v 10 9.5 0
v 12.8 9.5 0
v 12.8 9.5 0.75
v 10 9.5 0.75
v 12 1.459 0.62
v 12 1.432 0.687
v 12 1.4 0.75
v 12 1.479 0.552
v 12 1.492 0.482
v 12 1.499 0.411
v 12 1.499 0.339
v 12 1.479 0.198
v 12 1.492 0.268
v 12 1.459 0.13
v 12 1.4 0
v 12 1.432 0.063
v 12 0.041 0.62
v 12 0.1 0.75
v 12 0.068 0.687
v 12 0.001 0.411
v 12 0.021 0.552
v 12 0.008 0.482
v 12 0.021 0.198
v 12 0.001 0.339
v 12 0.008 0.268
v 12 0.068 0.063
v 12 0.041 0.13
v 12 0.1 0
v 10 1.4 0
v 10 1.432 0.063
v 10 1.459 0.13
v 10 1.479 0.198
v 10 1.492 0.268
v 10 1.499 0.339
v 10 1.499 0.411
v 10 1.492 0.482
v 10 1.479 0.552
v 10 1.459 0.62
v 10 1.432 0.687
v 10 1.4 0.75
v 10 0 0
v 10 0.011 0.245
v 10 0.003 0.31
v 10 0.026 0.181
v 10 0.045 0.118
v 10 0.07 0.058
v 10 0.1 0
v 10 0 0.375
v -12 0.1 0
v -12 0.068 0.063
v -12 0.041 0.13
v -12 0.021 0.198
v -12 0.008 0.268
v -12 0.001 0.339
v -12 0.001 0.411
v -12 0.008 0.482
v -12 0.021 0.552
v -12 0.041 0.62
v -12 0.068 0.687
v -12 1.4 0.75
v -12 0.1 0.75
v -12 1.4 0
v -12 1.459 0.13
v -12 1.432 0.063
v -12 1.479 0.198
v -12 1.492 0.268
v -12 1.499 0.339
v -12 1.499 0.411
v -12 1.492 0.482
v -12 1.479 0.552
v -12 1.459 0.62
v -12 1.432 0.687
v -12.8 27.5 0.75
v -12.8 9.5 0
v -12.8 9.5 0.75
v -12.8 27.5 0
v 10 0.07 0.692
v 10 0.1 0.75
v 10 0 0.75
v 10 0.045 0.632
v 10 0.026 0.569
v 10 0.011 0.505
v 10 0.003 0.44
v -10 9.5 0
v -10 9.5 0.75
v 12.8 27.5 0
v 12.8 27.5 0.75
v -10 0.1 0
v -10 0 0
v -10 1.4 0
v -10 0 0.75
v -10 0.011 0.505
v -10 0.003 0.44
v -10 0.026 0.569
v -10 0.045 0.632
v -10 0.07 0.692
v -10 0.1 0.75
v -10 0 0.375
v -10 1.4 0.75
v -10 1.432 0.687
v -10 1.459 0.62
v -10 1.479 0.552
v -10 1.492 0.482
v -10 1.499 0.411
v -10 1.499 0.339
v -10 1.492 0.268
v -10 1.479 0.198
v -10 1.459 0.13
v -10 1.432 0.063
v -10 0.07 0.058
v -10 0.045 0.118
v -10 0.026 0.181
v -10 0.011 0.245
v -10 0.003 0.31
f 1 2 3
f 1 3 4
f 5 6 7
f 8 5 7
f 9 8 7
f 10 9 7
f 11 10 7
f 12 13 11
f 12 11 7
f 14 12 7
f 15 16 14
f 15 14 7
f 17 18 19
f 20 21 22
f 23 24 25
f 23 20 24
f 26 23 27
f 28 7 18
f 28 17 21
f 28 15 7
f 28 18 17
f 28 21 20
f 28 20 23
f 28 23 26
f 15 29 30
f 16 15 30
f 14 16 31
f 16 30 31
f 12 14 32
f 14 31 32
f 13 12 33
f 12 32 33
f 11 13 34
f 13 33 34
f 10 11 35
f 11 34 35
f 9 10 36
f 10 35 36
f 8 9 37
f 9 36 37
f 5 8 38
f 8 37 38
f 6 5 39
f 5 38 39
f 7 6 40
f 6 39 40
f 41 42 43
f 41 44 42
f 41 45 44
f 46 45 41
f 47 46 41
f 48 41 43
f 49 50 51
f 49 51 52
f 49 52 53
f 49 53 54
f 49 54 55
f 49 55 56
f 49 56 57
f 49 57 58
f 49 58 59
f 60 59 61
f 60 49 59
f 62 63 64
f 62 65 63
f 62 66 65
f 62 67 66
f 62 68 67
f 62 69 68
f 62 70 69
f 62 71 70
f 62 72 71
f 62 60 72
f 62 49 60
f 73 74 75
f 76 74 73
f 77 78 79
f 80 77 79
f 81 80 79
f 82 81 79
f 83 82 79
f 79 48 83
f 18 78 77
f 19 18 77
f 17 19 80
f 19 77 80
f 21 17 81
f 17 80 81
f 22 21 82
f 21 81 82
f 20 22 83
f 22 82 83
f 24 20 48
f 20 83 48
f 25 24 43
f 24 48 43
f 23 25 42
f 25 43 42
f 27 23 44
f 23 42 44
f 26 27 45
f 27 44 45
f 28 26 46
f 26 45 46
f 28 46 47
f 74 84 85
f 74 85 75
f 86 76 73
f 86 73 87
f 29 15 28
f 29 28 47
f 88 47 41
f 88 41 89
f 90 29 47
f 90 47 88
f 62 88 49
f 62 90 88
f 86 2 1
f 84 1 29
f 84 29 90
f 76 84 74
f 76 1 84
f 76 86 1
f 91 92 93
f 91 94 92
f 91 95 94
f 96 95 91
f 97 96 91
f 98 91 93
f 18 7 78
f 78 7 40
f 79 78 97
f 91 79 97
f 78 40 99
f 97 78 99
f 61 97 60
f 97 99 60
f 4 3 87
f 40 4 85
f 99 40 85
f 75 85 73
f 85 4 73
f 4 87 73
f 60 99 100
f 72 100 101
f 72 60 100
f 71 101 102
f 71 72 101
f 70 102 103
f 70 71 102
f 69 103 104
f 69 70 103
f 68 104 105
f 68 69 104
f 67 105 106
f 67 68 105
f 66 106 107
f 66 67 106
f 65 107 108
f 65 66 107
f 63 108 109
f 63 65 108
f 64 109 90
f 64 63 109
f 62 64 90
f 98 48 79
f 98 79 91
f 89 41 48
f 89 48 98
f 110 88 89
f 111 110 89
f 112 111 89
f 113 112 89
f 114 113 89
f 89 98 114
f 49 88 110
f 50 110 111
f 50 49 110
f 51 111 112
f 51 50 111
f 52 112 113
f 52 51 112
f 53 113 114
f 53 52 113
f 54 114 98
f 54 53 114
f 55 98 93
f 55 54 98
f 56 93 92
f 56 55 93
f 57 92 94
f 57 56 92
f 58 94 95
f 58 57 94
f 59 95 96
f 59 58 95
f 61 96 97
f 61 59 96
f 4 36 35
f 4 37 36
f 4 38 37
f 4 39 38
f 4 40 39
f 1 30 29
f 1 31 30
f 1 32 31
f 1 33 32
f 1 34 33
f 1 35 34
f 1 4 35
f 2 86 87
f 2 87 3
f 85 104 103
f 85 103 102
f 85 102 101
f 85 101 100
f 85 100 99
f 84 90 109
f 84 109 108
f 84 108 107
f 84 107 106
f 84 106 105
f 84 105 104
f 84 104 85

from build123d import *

# Parameters (mm, degrees)
BOSS_EXTRUDE1_DEPTH = 0.75
SKETCH2_R           = 1.584525309
SKETCH2_R_2         = 0.75
CUT_EXTRUDE1_DEPTH  = 2
CUT_EXTRUDE2_START  = -2
SKETCH3_R           = 1.564549905
SKETCH3_R_2         = 0.75
CUT_EXTRUDE2_DEPTH  = 2


with BuildPart() as part:
    # Sketch1 → Boss-Extrude1 (new body)
    with BuildSketch(Plane.XY):
        Polygon((12, 0), (-12, 0), (-12, 1.5), (-10, 1.5), (-10, 9.5), (-12.8, 9.5), (-12.8, 27.5), (12.8, 27.5), (12.8, 9.5), (10, 9.5), (10, 1.5), (12, 1.5), align=None)
    extrude(amount=BOSS_EXTRUDE1_DEPTH)

    # Sketch2 → Cut-Extrude1 (cut)
    with BuildSketch(Plane.ZY.offset(12)):
        with Locations((0.375, 0.75)):
            Circle(SKETCH2_R)
        with Locations((0.375, 0.75)):
            Circle(SKETCH2_R_2, mode=Mode.SUBTRACT)
    extrude(amount=-CUT_EXTRUDE1_DEPTH, mode=Mode.SUBTRACT)

    # Sketch3 → Cut-Extrude2 (cut)
    with BuildSketch(Plane(origin=(12, 0, 0), x_dir=(0, 0, -1), z_dir=(1, 0, 0)).offset(CUT_EXTRUDE2_START)):
        with Locations((-0.375, 0.75)):
            Circle(SKETCH3_R)
        with Locations((-0.375, 0.75)):
            Circle(SKETCH3_R_2, mode=Mode.SUBTRACT)
    extrude(amount=CUT_EXTRUDE2_DEPTH, mode=Mode.SUBTRACT)


solid = part.part
